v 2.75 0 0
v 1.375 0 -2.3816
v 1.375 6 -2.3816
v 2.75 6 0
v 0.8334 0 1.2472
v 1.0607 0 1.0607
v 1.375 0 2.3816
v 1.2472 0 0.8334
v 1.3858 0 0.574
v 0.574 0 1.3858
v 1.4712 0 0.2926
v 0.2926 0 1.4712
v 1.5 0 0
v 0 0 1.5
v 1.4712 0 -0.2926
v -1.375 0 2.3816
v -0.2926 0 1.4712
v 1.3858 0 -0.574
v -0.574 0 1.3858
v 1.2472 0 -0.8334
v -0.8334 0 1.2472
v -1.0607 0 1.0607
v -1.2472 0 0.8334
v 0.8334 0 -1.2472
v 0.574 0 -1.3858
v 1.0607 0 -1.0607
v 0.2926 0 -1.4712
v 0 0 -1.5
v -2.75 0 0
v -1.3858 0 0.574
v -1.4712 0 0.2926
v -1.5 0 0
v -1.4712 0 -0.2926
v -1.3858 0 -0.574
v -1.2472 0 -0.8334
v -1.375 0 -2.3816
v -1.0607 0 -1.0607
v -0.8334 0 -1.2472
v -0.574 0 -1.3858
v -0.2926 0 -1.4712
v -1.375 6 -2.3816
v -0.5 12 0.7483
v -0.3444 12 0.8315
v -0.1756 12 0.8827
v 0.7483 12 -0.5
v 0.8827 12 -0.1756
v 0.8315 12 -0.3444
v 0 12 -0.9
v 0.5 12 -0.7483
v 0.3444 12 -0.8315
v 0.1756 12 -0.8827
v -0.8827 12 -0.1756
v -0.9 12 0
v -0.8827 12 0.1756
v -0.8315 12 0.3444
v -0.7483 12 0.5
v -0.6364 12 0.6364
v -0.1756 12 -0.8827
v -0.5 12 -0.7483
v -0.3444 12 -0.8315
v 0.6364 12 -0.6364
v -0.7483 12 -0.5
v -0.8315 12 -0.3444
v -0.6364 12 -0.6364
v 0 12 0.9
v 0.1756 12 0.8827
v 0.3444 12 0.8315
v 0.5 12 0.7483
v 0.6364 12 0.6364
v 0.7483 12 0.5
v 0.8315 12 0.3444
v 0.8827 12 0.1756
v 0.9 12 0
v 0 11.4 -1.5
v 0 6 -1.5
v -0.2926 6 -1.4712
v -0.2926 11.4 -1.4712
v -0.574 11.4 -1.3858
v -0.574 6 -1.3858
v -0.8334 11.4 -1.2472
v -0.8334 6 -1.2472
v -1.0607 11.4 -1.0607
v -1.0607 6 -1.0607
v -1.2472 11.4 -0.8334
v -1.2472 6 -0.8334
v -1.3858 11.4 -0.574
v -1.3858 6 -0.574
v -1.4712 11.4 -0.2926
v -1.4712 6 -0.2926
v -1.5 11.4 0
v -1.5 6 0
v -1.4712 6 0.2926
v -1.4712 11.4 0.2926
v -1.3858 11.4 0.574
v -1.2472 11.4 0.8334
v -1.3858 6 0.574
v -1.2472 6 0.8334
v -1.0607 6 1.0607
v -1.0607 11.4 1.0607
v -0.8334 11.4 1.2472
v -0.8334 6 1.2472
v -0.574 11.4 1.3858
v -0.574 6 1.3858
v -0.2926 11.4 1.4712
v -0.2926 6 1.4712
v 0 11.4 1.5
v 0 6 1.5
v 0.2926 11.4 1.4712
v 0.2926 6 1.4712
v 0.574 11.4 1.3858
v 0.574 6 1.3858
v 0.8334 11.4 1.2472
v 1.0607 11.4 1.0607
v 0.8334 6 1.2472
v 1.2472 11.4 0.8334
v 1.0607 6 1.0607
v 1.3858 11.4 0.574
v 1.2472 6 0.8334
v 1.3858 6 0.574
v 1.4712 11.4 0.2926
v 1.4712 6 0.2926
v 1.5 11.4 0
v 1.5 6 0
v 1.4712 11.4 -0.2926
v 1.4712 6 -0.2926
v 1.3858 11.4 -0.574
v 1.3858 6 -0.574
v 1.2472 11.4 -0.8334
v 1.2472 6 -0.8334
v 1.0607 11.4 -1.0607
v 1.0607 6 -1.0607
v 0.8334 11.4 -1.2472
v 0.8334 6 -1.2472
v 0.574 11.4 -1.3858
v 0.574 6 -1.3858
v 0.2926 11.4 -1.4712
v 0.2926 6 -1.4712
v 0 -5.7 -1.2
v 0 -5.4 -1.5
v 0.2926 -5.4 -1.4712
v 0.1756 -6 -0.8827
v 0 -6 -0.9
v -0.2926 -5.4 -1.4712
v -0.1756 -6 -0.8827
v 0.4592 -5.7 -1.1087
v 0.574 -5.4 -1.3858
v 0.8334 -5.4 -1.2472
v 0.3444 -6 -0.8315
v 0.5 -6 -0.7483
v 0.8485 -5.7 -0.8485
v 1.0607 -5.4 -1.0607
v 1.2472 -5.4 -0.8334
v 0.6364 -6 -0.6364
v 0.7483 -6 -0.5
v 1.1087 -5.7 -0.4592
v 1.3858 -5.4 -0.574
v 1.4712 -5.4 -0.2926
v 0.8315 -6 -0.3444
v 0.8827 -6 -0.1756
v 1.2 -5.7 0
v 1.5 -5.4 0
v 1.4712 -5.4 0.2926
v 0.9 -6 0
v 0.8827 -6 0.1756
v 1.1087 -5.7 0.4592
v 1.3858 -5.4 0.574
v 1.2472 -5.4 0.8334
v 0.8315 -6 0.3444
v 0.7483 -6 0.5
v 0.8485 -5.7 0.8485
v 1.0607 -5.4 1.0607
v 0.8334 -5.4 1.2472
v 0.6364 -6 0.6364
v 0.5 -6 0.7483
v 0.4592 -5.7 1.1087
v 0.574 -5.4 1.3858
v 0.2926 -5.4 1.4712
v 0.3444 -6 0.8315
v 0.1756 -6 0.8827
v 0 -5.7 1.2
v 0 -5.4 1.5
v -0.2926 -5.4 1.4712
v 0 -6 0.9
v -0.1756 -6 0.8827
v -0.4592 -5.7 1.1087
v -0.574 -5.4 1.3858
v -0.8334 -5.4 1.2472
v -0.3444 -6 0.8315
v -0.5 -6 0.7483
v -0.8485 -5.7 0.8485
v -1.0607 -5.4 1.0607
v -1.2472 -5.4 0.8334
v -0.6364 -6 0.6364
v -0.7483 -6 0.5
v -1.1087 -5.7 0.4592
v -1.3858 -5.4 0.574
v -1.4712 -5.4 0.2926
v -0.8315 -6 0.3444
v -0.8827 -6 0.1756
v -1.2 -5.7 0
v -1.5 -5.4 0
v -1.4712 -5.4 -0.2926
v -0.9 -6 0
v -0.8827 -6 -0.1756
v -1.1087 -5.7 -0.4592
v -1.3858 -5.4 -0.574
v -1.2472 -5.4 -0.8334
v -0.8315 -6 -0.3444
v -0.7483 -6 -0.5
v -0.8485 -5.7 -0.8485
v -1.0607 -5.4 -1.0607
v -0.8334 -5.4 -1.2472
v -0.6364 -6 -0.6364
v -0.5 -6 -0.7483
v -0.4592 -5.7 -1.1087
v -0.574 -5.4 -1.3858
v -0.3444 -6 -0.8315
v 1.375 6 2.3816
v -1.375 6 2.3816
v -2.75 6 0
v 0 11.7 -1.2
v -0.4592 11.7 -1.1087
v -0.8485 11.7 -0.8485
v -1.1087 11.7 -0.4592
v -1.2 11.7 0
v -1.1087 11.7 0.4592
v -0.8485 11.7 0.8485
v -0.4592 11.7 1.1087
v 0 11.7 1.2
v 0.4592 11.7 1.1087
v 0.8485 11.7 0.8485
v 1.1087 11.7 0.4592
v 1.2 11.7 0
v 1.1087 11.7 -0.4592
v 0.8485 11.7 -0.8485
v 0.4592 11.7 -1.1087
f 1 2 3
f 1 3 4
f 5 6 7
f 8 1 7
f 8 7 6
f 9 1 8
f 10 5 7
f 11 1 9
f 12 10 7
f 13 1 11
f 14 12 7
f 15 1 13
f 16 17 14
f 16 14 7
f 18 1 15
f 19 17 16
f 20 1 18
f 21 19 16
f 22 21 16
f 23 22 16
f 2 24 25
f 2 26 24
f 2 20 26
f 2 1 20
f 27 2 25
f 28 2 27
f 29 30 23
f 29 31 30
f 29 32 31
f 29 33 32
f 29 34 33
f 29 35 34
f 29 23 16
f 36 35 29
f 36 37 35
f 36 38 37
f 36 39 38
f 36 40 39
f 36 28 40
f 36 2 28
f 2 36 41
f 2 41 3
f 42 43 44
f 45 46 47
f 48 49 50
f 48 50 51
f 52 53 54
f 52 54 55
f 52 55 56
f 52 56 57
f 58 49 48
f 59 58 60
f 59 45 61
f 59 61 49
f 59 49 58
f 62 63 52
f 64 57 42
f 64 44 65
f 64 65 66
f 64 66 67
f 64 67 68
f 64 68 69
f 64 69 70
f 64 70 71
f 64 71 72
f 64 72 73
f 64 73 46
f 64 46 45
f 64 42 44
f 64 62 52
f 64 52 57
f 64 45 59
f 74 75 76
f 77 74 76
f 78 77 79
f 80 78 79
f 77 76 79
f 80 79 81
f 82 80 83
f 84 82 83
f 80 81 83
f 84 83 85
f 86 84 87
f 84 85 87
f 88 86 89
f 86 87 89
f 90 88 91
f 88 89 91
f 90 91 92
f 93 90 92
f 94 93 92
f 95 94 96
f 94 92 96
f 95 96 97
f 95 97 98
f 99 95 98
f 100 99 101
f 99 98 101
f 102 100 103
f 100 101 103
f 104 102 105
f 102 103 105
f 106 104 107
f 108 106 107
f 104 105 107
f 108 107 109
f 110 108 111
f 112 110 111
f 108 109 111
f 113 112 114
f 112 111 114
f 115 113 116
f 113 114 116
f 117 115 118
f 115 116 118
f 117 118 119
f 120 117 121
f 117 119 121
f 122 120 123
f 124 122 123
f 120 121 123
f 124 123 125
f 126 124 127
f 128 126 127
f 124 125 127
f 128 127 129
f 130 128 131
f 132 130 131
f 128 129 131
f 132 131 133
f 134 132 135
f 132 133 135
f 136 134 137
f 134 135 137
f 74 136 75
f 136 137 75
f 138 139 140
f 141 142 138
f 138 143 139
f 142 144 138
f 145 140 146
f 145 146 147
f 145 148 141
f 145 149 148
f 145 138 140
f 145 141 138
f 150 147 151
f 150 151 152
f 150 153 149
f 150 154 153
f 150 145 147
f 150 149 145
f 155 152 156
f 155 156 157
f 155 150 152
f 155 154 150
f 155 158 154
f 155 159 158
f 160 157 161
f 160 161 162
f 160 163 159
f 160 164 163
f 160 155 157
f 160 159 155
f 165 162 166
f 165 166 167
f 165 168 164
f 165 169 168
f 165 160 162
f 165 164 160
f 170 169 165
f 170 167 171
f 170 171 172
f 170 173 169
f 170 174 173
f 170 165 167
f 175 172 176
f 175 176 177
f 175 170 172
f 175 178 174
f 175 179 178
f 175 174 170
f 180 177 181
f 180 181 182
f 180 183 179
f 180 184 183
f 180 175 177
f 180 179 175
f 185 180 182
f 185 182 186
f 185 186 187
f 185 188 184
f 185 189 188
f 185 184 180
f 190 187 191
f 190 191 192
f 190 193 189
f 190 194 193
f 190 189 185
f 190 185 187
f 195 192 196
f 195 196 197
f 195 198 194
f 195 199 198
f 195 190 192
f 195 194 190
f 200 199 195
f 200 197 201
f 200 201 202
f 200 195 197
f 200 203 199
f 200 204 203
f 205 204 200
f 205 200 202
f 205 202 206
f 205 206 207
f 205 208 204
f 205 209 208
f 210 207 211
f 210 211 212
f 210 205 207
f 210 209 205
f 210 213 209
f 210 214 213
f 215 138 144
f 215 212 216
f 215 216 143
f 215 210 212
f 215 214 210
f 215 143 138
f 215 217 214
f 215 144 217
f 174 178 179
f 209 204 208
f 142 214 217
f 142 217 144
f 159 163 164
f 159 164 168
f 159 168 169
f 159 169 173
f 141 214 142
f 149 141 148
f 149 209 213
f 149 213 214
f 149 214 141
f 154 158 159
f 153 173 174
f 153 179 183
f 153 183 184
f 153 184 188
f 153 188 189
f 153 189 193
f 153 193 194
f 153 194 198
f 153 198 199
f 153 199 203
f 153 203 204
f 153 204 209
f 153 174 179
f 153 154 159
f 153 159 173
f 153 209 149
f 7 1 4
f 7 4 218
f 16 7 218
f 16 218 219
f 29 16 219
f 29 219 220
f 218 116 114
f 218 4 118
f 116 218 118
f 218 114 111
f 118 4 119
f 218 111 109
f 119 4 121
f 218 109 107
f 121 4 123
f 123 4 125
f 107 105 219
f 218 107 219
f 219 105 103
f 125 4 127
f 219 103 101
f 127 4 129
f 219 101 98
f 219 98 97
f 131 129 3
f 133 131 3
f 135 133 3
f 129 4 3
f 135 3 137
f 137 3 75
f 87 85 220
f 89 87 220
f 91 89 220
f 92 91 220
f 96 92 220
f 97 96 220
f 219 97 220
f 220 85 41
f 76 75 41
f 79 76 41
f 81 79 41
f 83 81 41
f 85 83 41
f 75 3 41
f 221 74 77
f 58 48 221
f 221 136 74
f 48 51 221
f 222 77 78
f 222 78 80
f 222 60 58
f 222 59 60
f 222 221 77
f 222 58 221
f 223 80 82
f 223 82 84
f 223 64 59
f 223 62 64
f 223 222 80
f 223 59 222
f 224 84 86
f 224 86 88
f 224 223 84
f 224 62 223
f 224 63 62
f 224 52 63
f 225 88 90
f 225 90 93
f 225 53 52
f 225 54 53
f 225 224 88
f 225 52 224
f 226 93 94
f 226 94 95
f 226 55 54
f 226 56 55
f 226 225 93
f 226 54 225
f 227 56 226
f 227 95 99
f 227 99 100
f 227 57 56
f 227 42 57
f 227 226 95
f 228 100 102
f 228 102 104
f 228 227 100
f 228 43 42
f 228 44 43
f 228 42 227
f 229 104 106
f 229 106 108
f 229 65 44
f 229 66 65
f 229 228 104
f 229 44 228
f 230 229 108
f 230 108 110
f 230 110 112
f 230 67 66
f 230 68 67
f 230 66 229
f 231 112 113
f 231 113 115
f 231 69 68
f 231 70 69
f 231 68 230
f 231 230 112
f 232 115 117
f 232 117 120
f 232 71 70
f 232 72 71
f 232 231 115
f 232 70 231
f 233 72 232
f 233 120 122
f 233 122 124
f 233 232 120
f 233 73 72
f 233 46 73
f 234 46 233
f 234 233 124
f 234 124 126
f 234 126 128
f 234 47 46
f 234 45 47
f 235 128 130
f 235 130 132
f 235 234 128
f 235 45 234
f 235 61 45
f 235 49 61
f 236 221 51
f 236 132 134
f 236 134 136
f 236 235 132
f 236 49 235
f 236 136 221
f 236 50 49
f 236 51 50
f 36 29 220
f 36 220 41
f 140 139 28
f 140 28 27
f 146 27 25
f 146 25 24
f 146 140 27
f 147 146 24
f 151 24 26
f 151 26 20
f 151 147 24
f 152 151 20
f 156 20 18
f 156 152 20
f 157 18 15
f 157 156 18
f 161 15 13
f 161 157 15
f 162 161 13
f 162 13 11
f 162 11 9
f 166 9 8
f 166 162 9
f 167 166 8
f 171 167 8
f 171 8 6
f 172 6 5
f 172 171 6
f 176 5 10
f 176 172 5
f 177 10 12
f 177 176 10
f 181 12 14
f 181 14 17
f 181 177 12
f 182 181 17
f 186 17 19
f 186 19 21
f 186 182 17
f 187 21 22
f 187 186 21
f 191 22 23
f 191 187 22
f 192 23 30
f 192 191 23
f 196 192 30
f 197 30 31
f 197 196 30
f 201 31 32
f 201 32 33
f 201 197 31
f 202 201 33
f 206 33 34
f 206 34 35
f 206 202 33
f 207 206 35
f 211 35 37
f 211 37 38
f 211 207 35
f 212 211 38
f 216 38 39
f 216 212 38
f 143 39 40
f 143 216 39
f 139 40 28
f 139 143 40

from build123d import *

# Parameters (mm, degrees)
EXTRUDE_1_DEPTH = 6
SKETCH_3_R      = 1.5
EXTRUDE_2_DEPTH = 6
EXTRUDE_START   = 6
SKETCH_4_R      = 1.5
EXTRUDE_3_DEPTH = 6
CHAMFER_1_SIZE  = 0.6


with BuildPart() as part:
    # Эскиз1 → Бобышка-Вытянуть1 (new body)
    with BuildSketch(Plane(origin=(0, 0, 0), x_dir=(1, 0, 0), z_dir=(0, 1, 0))):
        Polygon((-2.75, 0), (-1.375, 2.38156986), (1.375, 2.38156986), (2.75, 0), (1.375, -2.38156986), (-1.375, -2.38156986), align=None)
    extrude(amount=EXTRUDE_1_DEPTH)

    # Эскиз3 → Бобышка-Вытянуть2 (add)
    with BuildSketch(Plane(origin=(0, 6, 0), x_dir=(1, 0, 0), z_dir=(0, 1, 0))):
        with Locations(Location((0, 0, 0), (0, 0, 90))):
            Circle(SKETCH_3_R)
    extrude(amount=EXTRUDE_2_DEPTH)

    # Эскиз4 → Бобышка-Вытянуть3 (add)
    with BuildSketch(Plane.XZ.offset(EXTRUDE_START)):
        with Locations(Location((0, 0, 0), (0, 0, 270))):
            Circle(SKETCH_4_R)
    extrude(amount=-EXTRUDE_3_DEPTH)

    # Фаска1
    chamfer_1_edges = [part.edges().sort_by_distance(p)[0] for p in [
        (0, 12, 1.5),
        (0, -6, 1.5),
    ]]
    chamfer(chamfer_1_edges, length=CHAMFER_1_SIZE)


solid = part.part
